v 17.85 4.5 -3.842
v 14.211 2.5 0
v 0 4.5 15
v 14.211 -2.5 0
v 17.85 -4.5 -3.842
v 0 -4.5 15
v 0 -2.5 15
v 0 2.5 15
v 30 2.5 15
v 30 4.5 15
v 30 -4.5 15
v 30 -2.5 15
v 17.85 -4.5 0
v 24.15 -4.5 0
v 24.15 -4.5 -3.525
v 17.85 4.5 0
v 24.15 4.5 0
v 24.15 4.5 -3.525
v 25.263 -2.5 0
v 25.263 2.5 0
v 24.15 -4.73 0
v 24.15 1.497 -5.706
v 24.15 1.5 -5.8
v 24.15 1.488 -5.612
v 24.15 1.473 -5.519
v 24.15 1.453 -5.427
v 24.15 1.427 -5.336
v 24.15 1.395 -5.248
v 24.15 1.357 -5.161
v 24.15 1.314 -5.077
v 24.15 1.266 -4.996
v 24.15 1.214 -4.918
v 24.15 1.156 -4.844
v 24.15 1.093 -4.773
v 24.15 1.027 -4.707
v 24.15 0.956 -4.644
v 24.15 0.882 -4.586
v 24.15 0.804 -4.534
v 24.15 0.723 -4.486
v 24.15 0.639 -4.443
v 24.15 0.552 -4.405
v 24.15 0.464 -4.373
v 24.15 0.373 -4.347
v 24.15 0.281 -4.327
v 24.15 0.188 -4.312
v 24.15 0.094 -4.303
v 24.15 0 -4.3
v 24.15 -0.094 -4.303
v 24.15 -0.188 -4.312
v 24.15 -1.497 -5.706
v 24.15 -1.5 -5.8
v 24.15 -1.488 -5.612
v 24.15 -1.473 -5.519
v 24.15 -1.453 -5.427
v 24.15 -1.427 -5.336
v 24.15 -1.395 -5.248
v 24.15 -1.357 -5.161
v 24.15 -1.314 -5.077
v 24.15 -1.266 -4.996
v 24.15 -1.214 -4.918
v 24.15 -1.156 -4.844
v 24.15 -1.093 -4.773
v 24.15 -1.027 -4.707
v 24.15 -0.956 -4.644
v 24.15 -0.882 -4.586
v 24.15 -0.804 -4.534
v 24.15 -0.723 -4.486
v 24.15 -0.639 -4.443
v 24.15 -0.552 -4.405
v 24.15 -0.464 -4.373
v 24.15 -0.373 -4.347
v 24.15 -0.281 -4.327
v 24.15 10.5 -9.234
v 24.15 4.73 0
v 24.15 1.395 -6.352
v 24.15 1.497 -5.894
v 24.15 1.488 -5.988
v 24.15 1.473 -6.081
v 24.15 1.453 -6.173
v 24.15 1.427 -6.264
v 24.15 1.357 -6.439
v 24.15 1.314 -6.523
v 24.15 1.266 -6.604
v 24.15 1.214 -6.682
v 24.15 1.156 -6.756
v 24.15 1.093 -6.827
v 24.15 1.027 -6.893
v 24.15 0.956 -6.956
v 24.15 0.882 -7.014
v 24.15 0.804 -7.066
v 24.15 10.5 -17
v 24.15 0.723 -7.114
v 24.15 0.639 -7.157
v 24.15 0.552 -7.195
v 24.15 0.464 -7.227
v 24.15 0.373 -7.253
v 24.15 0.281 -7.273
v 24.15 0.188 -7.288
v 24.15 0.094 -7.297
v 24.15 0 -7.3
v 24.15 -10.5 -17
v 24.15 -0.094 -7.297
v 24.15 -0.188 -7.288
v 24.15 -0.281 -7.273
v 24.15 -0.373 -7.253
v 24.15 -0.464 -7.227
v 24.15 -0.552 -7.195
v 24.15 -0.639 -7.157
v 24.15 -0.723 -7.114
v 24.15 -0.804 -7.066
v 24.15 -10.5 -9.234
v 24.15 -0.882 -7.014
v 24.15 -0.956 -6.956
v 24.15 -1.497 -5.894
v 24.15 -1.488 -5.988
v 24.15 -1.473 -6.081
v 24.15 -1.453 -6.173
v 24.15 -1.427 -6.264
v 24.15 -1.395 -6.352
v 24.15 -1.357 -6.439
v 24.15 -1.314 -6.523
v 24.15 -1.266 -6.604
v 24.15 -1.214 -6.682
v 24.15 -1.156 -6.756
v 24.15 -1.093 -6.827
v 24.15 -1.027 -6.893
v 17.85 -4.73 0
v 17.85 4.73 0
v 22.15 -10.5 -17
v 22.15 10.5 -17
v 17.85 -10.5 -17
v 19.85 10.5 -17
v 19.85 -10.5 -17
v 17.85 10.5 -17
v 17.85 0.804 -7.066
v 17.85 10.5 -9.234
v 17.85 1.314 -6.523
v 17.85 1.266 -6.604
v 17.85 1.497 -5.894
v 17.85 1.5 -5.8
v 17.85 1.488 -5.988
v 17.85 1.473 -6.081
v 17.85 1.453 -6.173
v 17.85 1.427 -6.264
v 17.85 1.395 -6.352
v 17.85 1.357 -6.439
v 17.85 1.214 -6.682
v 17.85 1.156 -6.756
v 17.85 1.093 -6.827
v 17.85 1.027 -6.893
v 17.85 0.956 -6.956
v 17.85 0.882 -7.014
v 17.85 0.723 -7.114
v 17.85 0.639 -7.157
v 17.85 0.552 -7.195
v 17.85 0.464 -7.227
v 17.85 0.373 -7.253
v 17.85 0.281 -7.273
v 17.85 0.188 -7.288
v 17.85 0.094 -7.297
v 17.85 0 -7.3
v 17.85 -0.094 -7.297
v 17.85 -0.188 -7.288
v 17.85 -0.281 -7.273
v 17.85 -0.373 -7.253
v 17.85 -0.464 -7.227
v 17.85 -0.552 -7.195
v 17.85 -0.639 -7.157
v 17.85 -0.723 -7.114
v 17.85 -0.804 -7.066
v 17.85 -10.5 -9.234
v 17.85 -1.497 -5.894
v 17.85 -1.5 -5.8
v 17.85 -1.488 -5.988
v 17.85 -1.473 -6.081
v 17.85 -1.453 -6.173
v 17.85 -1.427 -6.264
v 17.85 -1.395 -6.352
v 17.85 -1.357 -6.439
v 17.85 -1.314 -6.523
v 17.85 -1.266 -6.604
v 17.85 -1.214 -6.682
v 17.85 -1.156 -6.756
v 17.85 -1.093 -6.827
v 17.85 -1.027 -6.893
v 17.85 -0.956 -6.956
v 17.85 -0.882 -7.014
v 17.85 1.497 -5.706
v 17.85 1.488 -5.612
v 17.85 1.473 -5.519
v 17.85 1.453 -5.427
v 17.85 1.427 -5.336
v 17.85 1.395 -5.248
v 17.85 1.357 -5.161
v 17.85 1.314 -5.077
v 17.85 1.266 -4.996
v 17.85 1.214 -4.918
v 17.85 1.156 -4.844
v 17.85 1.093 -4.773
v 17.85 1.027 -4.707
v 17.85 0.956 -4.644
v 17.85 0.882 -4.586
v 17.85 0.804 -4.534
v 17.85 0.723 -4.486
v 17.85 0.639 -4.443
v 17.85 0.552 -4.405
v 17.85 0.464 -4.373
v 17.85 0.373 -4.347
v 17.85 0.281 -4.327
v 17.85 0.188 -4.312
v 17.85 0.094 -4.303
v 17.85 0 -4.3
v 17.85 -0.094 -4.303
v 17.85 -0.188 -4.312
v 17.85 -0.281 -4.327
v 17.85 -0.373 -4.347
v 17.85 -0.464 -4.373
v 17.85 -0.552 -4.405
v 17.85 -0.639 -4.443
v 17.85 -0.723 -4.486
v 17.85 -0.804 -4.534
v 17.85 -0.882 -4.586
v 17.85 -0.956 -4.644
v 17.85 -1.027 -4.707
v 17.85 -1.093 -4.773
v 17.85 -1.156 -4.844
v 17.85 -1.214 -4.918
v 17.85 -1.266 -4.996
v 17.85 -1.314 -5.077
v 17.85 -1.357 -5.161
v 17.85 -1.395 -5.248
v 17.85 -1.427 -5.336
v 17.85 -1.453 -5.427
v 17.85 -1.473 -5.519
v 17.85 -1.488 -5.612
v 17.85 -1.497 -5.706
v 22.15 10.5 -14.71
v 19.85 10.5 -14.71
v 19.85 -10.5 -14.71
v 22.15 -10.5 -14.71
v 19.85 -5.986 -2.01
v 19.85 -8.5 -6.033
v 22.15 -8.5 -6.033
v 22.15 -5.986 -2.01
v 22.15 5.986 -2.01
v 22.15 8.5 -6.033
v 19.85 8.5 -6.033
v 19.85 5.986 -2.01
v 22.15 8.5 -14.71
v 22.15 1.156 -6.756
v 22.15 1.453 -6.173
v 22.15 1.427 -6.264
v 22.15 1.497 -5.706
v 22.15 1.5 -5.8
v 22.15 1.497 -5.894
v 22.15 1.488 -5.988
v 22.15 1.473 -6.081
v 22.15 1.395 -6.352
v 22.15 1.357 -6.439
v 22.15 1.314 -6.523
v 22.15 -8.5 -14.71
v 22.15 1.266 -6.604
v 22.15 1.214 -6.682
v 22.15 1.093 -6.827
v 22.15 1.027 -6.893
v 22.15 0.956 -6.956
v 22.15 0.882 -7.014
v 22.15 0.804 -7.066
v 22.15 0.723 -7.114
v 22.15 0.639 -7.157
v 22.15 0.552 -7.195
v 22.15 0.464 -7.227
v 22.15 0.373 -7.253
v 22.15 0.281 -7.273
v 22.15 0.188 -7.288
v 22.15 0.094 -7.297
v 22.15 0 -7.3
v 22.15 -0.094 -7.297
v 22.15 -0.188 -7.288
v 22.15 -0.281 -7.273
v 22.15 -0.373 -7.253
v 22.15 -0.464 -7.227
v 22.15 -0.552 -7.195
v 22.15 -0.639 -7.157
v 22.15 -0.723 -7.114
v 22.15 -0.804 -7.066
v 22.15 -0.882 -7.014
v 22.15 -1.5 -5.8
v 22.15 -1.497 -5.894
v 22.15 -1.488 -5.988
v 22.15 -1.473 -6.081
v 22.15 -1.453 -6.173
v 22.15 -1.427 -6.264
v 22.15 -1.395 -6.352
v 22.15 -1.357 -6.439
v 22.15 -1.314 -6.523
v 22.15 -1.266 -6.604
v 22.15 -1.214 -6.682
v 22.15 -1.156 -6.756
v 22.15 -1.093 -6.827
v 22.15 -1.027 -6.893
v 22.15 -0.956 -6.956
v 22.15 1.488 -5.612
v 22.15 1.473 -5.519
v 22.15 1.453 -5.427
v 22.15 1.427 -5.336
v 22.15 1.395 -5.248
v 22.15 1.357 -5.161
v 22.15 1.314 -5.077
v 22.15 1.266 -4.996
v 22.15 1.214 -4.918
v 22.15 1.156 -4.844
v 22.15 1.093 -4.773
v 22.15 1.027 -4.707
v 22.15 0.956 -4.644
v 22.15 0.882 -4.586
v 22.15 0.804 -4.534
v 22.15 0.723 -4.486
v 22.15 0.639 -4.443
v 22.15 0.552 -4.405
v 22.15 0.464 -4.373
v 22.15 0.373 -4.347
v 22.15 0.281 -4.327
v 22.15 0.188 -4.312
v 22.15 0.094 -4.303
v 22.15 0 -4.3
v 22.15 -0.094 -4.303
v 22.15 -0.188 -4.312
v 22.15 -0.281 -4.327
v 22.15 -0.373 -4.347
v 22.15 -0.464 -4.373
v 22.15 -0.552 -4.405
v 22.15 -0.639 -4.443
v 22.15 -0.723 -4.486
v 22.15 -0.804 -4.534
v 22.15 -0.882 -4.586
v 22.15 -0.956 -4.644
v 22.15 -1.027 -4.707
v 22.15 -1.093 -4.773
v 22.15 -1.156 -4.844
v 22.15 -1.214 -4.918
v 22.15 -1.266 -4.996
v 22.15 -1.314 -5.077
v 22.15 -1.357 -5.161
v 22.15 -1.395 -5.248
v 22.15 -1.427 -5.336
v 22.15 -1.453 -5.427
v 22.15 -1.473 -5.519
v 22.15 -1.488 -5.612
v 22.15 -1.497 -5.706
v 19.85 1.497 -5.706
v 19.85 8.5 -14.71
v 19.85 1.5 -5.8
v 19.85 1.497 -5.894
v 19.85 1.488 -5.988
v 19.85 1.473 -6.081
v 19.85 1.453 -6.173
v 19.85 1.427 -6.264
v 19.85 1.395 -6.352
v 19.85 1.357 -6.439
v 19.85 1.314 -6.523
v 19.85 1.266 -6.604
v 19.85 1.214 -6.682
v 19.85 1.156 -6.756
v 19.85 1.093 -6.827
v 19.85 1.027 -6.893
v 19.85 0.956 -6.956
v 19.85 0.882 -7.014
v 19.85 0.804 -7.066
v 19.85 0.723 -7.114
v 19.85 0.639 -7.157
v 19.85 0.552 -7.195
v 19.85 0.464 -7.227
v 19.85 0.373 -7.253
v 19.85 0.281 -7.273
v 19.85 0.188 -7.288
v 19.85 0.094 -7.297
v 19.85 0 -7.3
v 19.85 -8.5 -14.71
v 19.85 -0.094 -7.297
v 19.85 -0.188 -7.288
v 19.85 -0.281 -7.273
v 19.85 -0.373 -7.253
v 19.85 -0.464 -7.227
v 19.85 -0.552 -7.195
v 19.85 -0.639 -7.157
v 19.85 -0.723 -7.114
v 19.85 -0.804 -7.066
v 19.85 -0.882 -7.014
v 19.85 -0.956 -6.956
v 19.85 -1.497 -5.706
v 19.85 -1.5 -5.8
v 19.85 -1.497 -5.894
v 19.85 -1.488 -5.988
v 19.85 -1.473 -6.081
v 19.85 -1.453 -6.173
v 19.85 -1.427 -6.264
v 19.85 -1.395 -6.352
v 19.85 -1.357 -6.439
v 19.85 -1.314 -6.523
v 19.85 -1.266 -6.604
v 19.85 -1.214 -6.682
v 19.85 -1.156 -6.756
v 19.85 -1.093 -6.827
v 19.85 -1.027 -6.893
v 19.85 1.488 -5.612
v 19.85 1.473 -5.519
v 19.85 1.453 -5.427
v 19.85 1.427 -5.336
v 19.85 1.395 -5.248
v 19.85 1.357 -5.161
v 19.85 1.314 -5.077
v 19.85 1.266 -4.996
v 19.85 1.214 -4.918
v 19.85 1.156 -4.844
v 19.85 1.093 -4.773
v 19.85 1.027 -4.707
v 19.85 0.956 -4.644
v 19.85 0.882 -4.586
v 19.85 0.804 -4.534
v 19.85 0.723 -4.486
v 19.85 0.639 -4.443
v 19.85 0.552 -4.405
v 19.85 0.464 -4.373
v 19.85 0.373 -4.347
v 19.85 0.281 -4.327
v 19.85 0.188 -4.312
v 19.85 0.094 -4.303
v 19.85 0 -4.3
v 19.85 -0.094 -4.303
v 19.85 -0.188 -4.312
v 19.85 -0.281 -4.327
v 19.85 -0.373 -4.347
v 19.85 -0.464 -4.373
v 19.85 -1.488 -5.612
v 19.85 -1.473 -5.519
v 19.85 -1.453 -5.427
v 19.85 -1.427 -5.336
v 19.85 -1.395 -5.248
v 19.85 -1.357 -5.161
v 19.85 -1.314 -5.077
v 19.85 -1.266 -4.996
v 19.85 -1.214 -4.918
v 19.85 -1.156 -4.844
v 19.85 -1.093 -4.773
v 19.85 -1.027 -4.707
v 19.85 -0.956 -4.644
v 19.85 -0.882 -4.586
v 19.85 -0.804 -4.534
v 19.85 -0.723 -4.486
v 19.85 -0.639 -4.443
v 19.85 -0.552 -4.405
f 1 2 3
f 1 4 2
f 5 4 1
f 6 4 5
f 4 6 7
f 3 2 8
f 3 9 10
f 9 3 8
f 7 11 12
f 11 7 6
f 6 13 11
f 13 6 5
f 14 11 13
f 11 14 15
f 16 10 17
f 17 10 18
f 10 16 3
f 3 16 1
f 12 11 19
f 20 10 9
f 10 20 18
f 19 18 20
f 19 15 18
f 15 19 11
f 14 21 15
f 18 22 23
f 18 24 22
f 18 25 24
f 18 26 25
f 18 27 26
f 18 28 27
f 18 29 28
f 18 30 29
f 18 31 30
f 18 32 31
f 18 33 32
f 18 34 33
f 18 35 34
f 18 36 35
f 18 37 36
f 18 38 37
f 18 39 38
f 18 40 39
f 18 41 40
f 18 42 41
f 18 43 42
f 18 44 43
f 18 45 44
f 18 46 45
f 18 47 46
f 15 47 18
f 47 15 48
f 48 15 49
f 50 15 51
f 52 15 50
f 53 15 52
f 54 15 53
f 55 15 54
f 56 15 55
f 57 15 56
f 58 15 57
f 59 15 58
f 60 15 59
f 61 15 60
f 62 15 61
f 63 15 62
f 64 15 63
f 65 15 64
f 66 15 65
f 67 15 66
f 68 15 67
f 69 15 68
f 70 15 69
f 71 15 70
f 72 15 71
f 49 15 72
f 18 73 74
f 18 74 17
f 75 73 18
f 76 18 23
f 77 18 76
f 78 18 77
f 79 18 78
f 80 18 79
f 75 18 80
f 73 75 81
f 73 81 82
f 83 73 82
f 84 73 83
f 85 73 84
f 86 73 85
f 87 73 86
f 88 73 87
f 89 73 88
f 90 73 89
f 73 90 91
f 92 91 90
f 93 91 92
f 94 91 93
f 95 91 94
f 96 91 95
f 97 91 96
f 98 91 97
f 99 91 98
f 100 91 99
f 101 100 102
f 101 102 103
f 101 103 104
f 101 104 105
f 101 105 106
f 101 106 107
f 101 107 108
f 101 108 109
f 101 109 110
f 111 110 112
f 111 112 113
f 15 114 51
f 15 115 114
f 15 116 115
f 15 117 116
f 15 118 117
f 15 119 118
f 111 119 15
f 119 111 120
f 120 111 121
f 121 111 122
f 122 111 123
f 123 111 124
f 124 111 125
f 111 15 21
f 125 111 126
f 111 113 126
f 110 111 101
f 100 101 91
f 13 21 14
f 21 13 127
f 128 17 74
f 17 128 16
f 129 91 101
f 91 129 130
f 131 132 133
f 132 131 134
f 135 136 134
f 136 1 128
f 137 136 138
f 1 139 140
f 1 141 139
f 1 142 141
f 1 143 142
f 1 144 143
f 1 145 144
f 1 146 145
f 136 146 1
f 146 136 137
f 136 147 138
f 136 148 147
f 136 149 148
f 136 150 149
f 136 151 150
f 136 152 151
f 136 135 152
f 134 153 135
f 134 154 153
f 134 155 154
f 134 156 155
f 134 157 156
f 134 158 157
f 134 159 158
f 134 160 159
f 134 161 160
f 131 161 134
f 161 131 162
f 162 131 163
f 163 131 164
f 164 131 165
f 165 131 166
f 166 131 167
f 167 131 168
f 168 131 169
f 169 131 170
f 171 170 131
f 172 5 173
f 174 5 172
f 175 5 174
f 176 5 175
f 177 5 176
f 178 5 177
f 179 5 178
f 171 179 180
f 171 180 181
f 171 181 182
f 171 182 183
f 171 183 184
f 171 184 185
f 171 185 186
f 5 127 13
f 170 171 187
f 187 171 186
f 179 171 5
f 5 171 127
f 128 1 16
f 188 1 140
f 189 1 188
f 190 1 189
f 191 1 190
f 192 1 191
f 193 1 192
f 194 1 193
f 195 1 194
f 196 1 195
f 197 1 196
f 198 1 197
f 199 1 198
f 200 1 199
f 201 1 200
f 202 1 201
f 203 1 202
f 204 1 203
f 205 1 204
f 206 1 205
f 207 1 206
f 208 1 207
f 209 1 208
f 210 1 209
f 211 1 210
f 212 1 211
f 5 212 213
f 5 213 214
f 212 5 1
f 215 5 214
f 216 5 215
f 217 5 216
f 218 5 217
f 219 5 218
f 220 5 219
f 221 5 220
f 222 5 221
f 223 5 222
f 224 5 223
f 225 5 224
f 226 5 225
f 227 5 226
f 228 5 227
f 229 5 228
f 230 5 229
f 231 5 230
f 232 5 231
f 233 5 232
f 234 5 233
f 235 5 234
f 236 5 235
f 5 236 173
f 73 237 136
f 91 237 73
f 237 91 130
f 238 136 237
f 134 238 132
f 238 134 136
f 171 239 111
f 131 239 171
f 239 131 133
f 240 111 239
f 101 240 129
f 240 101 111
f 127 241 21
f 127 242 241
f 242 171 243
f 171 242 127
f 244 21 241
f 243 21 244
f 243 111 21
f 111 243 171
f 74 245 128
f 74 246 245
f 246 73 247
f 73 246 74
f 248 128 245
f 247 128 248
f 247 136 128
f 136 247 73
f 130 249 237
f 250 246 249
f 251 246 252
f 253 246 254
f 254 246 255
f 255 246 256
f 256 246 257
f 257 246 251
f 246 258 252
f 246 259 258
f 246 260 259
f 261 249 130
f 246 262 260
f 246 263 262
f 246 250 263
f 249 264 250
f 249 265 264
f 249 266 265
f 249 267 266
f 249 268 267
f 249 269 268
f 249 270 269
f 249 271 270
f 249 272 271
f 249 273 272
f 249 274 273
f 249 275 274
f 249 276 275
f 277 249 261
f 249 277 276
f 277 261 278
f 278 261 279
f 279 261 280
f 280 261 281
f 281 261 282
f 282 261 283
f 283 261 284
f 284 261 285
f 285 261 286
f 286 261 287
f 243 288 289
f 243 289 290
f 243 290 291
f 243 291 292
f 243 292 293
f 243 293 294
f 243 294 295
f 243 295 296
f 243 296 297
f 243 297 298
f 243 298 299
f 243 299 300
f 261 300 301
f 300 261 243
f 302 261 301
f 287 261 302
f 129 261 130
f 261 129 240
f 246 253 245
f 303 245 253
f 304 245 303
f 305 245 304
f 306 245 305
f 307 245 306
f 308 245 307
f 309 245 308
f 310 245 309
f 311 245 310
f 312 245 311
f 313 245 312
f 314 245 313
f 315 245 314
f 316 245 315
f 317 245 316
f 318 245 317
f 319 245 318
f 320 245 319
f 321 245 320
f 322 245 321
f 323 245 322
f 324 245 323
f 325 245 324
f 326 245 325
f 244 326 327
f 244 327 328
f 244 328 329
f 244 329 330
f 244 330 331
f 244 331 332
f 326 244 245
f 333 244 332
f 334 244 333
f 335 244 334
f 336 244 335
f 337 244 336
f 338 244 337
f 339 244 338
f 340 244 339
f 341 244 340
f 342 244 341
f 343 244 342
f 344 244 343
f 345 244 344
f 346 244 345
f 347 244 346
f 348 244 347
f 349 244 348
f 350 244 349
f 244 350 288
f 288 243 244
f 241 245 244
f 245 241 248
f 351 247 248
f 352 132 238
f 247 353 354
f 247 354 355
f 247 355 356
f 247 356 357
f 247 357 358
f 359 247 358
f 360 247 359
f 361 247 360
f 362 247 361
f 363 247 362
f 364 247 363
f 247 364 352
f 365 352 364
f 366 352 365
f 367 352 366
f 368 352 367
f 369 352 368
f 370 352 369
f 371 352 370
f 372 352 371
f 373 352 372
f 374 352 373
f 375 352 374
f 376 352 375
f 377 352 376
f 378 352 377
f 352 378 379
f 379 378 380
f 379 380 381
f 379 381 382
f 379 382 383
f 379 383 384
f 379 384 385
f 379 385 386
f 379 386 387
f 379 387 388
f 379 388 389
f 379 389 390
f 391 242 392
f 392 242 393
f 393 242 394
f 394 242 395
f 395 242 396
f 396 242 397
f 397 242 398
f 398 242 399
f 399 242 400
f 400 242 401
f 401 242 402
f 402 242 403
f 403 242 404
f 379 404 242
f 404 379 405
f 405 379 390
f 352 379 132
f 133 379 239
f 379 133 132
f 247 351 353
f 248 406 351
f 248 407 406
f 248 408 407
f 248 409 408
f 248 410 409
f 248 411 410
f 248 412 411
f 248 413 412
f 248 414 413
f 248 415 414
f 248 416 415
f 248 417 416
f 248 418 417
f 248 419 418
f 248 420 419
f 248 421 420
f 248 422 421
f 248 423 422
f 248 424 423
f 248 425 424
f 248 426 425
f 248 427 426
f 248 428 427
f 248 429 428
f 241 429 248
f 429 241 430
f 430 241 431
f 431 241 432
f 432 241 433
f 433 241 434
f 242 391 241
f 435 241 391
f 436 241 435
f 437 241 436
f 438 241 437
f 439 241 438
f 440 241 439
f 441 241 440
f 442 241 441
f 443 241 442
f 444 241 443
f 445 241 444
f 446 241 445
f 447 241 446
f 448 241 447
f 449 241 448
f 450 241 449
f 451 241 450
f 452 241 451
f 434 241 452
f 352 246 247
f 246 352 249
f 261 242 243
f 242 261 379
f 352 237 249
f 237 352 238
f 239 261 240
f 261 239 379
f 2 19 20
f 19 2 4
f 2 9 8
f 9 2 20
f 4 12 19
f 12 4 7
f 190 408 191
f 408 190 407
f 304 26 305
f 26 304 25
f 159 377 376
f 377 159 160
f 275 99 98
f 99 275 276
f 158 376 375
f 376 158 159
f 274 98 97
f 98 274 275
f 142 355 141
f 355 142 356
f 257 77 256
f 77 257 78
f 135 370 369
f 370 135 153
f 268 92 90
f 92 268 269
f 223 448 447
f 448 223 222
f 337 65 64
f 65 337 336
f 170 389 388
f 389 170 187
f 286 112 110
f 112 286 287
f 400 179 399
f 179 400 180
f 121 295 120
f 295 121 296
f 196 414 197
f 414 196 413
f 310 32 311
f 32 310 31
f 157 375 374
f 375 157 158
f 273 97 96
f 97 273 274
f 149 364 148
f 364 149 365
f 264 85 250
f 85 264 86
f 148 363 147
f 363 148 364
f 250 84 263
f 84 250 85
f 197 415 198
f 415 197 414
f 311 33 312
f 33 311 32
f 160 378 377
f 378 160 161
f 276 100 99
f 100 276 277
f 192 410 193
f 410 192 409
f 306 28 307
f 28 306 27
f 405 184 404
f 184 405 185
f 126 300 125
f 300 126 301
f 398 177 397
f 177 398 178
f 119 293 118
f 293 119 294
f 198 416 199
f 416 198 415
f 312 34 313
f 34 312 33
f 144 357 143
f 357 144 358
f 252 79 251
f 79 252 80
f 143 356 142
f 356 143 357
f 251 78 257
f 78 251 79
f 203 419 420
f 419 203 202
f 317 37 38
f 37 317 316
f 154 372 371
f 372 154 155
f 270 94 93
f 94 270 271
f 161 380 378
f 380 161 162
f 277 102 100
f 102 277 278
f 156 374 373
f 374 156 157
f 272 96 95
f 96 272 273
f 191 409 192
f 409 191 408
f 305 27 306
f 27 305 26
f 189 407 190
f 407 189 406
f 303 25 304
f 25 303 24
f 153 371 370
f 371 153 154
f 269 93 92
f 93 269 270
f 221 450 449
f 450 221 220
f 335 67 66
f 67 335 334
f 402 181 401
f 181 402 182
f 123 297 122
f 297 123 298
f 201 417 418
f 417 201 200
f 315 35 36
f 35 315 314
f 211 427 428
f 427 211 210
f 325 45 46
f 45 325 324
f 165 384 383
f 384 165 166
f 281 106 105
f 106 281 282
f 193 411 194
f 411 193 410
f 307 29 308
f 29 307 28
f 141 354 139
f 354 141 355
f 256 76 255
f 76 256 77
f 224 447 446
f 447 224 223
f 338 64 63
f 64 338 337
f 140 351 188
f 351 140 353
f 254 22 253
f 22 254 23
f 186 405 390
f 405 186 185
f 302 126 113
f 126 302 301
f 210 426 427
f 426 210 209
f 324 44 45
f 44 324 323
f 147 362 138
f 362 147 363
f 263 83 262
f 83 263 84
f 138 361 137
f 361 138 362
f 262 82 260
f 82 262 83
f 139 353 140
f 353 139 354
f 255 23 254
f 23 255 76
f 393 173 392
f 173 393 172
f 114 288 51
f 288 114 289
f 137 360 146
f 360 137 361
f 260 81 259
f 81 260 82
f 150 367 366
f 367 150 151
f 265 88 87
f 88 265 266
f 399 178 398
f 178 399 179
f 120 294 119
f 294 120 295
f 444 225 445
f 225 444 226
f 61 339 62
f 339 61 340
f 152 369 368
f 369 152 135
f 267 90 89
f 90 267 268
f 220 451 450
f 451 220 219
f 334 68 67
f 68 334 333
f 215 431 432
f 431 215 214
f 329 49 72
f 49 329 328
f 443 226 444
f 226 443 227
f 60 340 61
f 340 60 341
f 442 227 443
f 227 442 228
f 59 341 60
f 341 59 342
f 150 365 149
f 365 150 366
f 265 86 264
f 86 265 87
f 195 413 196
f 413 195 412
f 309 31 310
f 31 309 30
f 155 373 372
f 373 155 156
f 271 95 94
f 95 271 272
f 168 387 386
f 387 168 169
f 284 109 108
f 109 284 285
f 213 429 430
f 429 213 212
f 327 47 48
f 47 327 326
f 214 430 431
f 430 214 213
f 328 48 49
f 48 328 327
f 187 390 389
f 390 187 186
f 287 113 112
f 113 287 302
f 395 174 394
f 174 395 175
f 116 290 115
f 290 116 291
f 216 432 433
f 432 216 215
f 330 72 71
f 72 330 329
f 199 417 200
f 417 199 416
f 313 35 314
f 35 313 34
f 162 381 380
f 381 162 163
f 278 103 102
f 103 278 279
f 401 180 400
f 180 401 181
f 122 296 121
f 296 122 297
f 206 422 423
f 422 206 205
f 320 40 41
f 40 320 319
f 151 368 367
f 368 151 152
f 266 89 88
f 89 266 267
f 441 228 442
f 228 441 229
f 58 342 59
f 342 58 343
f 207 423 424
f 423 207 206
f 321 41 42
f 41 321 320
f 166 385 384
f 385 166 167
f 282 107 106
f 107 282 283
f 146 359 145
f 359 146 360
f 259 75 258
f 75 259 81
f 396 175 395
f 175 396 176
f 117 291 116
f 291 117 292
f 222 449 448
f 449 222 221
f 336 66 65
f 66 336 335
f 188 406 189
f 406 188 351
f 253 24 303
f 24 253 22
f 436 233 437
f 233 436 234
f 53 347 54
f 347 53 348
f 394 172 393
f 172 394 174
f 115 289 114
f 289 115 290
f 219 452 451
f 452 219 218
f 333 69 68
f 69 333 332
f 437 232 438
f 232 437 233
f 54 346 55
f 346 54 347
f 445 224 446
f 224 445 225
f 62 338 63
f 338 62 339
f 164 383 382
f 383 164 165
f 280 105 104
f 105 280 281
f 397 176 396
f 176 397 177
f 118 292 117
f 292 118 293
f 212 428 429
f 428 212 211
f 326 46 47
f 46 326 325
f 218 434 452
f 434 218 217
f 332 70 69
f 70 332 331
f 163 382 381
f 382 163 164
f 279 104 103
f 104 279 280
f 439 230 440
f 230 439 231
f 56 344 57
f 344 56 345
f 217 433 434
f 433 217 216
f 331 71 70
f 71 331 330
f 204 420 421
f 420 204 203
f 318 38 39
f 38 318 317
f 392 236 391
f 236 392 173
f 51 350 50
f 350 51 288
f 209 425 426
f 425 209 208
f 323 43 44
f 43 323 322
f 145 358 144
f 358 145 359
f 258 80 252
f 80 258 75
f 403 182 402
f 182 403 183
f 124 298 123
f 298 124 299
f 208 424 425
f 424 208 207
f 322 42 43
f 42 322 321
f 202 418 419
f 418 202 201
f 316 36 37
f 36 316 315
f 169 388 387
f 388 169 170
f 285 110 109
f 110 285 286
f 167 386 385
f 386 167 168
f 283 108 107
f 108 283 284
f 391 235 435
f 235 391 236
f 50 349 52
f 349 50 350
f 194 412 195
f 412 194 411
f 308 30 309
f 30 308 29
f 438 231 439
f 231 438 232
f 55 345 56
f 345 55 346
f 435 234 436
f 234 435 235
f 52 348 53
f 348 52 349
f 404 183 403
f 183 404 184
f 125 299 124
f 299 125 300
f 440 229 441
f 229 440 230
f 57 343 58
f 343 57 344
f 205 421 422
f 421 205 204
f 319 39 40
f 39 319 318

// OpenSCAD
$fs = 0.01;
$fn = 100;

thick = 2;
board_thick = 5;
a = 15;
b = 4;
c = 30;

slot = [2.3, 17, 15];
lower = 12;
extra = 4;
block = slot+[extra,extra,extra/2];

screw_diam = 3;

difference()
{
    union()
    {
        translate([0,0,-b])
        rotate(90, [1,0,0])
        translate([0,0,-thick-board_thick/2])
        linear_extrude(2*thick+board_thick)
        {
            polygon([[0,a+b], [c,a+b], [0.8*c,0], [0.6*c,0]]);
        }

        translate([0.7*c,0,-block.z])
        translate([0,0,block.z/2])
        cube(block, true);
    }

    translate([0,-board_thick/2,0])
    cube([c,board_thick,a+$fs]);

    translate([0.7*c,0,-block.z])
    {
        translate([0,0,slot.z/2-$fs])
        cube(slot, true);

        translate([0,0,slot.x/2-$fs])
        cube([slot.x,block.y+$fs,slot.x], true);
        for (sign = [-1,1])
        {
            angle = 32;
            y = 15;
            z = 10;
            d = 10;
            h = 11.5;
            translate([0,sign*y,z])
            rotate(sign*angle,[1,0,0])
            translate([0,0,h/2])
            cube([10,d,h], true);
        }
    }

    translate([0.7*c-(extra+slot.x)/2-$fs/2,0,-extra/2-slot.x-screw_diam/2])
    rotate(90, [0,1,0])
    cylinder(extra+slot.x+$fs,screw_diam/2,screw_diam/2);

}
